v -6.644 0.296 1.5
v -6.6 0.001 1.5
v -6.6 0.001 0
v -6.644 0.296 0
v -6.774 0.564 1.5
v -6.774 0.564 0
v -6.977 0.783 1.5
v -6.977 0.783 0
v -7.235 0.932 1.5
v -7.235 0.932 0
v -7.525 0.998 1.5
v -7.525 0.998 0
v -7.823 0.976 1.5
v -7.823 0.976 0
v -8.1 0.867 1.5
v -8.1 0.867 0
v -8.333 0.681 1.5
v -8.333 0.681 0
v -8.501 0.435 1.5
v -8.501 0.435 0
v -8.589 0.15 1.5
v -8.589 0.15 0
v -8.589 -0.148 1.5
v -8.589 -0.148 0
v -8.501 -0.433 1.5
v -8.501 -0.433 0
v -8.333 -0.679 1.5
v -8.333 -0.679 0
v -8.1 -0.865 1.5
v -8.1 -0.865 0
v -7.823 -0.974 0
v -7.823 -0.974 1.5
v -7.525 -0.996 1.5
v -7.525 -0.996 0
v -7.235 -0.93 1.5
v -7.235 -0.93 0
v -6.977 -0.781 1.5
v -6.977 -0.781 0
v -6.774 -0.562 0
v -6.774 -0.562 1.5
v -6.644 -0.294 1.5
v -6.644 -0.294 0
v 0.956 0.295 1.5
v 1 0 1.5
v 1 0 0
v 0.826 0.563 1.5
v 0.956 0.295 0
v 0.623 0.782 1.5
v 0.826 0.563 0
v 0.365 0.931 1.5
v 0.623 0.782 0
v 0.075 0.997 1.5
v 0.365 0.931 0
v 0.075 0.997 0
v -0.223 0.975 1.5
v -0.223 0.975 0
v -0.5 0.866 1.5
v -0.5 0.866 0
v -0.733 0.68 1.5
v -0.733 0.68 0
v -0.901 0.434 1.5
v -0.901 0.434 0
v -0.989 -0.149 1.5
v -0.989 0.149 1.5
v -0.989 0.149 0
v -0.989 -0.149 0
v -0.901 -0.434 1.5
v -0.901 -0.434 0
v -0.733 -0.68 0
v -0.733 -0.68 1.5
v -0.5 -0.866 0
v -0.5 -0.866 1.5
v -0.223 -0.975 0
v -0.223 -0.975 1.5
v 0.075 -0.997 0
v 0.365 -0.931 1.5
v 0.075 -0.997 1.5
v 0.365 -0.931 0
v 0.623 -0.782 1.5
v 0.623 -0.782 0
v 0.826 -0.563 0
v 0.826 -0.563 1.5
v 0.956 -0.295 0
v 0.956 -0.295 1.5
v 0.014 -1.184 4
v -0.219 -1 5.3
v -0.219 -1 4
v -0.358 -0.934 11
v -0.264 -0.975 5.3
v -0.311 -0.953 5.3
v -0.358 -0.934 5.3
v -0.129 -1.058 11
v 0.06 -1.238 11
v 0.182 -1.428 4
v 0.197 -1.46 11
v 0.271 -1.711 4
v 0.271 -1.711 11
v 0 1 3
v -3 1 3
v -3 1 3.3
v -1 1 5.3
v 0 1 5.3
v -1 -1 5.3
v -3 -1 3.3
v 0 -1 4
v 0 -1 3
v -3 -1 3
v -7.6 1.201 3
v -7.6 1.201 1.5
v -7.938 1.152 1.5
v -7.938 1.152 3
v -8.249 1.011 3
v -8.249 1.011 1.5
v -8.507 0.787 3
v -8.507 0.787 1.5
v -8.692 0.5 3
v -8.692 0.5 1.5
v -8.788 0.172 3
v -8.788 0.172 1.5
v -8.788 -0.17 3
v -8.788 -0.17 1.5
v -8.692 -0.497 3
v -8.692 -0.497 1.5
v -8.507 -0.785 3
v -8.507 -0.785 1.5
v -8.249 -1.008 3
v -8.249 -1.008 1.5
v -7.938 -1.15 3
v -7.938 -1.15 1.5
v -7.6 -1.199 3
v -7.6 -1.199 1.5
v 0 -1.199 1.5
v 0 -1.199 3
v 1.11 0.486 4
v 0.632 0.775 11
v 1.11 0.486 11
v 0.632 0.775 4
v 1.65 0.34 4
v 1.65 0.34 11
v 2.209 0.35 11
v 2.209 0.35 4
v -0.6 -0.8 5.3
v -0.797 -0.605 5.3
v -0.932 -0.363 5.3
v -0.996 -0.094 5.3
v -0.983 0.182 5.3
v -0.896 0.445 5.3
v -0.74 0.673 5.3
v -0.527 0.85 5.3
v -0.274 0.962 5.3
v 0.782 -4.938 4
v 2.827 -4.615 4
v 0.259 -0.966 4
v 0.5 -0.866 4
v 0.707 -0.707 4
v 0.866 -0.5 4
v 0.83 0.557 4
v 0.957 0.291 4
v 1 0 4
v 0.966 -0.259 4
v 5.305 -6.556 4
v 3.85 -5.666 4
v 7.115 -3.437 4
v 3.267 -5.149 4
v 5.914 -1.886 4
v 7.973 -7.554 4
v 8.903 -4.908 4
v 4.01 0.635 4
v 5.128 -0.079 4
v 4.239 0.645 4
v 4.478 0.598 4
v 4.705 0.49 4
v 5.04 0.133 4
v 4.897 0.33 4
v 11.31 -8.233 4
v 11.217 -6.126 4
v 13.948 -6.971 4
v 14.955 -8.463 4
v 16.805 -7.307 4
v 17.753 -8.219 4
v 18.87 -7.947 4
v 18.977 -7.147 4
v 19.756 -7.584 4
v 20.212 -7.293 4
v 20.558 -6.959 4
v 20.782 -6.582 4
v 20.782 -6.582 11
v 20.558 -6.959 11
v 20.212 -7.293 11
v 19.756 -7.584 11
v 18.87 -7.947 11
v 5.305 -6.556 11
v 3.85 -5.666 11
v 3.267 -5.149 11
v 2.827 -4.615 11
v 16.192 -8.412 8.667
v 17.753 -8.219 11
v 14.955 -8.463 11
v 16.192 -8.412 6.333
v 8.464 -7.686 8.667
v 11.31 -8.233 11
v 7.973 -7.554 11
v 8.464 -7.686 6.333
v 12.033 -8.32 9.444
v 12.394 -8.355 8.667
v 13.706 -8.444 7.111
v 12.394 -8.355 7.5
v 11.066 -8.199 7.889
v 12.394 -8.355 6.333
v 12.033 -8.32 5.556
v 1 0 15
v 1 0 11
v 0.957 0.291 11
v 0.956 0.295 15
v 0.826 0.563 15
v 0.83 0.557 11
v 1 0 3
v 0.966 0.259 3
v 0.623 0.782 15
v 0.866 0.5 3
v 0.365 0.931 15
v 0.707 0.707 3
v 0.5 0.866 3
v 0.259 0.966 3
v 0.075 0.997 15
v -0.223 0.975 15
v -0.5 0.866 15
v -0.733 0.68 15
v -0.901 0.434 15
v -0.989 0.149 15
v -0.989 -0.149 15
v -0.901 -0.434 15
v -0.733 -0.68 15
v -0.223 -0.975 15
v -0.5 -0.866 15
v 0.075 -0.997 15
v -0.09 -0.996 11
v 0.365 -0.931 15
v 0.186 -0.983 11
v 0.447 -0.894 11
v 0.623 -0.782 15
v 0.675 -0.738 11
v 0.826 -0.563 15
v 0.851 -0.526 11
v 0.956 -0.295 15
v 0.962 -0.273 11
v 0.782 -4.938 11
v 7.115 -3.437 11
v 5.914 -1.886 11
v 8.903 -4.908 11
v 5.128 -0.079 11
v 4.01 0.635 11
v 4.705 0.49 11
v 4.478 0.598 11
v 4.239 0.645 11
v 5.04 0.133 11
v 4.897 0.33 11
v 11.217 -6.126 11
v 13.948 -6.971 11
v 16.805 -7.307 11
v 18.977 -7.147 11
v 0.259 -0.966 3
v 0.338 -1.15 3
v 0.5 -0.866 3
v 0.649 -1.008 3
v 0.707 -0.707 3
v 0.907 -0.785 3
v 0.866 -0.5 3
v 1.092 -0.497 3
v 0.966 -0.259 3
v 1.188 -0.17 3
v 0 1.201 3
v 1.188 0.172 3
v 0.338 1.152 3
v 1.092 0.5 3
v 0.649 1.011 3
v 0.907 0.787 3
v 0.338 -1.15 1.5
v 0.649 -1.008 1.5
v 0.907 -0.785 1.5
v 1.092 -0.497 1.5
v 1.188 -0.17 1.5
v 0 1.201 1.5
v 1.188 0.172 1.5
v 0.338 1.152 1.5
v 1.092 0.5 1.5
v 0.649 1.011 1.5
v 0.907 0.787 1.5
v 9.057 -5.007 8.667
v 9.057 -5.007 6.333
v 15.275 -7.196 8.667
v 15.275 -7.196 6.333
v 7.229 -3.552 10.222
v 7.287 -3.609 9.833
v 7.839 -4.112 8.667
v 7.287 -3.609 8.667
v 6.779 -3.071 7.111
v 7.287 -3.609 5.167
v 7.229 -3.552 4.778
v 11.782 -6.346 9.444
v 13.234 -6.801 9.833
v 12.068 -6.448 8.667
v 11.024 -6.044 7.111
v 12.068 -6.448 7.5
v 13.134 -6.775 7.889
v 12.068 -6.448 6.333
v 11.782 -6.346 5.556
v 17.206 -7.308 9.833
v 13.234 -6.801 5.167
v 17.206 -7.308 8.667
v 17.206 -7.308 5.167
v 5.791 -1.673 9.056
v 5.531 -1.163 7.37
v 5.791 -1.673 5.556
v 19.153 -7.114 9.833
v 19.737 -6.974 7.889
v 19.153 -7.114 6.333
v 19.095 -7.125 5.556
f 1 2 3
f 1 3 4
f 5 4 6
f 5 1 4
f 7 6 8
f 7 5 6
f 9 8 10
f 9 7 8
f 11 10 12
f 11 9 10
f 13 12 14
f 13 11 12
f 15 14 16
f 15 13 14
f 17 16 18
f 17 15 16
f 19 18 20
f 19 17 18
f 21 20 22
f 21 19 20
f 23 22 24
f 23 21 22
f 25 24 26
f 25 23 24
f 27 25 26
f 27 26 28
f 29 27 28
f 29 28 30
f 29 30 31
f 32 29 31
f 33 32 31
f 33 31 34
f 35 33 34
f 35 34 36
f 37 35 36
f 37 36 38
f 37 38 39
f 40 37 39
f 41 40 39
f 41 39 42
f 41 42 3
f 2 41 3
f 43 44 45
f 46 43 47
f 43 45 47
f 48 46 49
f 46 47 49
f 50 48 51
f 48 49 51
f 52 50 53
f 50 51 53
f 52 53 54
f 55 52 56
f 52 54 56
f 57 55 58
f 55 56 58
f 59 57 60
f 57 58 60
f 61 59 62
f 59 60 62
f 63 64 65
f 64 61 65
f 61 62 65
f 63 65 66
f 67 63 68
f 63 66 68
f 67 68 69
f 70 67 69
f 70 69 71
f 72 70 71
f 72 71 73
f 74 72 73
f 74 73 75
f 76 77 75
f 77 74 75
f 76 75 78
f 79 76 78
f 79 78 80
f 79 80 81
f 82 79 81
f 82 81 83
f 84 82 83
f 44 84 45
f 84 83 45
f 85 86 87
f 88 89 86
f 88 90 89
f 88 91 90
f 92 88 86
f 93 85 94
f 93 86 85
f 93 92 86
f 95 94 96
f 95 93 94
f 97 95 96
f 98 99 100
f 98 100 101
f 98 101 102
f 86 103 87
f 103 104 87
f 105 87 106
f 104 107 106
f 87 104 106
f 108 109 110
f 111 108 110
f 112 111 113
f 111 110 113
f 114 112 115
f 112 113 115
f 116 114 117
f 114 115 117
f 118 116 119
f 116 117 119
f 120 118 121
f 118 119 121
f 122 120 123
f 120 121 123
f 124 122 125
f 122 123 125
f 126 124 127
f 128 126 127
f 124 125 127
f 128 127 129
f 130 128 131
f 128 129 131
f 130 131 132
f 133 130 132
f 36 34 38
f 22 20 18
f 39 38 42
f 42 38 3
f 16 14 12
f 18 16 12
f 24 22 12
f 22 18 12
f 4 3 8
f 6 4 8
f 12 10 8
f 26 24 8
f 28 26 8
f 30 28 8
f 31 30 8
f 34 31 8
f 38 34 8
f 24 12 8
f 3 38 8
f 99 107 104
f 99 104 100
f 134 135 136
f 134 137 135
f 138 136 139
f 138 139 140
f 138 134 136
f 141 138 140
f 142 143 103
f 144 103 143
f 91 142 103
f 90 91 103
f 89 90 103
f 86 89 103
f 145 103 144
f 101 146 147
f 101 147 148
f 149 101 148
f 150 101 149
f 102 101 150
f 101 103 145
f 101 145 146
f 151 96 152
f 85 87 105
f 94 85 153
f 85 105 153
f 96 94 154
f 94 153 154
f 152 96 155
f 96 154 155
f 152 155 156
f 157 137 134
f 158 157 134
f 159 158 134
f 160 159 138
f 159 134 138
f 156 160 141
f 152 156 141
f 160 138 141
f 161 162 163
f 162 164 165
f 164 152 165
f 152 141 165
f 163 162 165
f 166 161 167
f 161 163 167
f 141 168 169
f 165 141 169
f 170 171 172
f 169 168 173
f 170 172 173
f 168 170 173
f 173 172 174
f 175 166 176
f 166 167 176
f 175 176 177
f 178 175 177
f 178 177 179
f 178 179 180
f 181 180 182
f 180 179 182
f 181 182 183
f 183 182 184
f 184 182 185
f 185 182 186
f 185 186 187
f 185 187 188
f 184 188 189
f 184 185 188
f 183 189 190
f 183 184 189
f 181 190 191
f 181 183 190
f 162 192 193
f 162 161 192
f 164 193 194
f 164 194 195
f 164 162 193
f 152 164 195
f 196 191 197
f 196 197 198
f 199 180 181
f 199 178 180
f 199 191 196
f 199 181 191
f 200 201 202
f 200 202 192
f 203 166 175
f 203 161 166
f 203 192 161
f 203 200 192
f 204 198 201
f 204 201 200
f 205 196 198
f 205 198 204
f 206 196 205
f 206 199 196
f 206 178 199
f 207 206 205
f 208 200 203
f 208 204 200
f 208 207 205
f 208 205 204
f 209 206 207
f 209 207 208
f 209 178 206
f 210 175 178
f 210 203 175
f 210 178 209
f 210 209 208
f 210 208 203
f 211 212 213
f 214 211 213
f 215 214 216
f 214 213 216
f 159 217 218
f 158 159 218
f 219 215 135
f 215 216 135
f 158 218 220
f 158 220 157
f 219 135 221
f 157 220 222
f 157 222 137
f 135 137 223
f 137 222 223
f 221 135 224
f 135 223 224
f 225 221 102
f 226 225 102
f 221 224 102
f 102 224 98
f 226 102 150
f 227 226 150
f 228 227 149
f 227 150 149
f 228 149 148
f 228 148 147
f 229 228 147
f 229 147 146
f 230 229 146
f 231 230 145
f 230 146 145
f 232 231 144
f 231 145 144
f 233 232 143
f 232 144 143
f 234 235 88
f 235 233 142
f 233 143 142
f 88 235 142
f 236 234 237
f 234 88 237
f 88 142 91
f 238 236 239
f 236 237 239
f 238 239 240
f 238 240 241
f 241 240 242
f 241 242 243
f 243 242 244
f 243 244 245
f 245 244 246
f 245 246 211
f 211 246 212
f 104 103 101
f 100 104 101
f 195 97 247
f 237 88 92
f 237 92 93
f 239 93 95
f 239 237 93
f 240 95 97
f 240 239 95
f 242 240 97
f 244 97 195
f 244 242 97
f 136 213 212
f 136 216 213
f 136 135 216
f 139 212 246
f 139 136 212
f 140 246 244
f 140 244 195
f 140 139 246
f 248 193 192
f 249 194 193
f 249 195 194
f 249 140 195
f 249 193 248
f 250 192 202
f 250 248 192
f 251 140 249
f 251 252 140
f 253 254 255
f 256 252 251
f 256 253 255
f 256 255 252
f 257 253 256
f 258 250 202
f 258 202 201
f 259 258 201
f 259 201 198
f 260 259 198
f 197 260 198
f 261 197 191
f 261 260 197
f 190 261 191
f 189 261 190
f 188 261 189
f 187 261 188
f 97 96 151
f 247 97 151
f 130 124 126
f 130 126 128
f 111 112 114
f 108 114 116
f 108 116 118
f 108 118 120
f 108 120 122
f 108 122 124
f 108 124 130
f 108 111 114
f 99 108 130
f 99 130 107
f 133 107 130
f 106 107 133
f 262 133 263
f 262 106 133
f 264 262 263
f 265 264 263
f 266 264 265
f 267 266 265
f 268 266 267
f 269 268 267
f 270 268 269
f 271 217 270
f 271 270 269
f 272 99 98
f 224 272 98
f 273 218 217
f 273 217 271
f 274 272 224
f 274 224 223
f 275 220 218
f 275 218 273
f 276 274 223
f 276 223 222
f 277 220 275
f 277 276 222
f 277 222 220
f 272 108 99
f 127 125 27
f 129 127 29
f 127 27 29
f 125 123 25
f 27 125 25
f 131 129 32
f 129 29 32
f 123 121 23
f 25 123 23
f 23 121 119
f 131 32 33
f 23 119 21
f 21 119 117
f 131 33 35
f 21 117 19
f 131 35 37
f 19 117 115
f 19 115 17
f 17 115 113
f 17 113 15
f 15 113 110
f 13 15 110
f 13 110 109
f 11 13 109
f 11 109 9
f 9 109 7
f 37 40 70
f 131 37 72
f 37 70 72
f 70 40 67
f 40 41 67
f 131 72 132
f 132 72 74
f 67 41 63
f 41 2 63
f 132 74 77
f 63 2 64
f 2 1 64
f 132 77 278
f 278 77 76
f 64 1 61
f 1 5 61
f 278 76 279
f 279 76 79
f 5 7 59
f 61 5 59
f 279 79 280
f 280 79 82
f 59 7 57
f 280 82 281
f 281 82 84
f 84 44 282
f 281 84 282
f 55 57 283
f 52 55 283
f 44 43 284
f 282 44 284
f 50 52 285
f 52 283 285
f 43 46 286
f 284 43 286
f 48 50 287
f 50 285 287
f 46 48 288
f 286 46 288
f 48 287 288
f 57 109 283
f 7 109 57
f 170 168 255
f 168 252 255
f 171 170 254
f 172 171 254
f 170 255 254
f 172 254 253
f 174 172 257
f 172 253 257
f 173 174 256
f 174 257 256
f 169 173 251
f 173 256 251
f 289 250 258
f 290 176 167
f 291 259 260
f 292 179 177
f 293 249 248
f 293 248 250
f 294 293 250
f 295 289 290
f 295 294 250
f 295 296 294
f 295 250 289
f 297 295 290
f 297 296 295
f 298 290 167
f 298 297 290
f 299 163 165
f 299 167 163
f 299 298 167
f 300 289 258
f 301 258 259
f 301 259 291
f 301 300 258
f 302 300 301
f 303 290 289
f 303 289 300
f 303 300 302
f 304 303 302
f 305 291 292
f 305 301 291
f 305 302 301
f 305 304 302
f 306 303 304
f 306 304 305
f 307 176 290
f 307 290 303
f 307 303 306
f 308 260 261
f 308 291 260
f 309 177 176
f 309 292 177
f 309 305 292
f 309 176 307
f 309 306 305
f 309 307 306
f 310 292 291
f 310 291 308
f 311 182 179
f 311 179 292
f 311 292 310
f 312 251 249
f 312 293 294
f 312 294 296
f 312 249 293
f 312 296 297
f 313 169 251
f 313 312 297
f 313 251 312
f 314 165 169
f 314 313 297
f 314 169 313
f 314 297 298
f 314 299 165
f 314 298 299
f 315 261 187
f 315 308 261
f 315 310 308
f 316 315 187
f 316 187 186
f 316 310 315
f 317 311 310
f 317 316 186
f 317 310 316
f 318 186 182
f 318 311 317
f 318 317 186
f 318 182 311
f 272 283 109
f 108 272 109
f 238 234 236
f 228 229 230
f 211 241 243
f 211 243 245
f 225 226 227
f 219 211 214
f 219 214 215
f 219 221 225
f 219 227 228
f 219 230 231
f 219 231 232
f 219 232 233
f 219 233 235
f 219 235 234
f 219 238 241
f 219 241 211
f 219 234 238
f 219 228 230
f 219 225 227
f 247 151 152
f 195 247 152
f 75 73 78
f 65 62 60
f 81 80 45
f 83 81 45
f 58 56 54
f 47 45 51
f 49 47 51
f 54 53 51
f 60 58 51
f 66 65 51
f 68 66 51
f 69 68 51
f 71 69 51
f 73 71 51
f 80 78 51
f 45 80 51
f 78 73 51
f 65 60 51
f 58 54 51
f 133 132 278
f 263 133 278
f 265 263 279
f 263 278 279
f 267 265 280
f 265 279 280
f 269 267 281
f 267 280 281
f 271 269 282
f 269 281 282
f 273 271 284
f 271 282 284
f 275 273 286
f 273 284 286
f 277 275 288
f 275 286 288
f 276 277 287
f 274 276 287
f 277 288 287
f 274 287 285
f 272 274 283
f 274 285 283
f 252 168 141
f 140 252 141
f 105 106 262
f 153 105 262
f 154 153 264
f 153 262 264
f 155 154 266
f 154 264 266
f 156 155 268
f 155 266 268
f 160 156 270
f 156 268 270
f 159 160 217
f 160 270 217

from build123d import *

# Parameters (mm, degrees)
SKETCH_1_R      = 1
EXTRUDE_1_DEPTH = 15
EXTRUDE_2_DEPTH = 1.5
SKETCH_3_R      = 1
EXTRUDE_3_DEPTH = 3
SKETCH_4_W      = 3
SKETCH_4_H      = 2
EXTRUDE_4_DEPTH = 2.3
EXTRUDE_5_DEPTH = 7
EXTRUDE_6_DEPTH = 7
FILLET_1_R      = 1
FILLET_2_R      = 1
FILLET_3_R      = 2
CHAMFER_2_SIZE  = 2


# Some blends are built 0.0001 mm under size
with BuildPart() as part:
    # Эскиз1 → Бобышка-Вытянуть1 (new body)
    with BuildSketch(Plane.XY):
        Circle(SKETCH_1_R)
    extrude(amount=EXTRUDE_1_DEPTH)

    # Эскиз2 → Бобышка-Вытянуть2 (add)
    with BuildSketch(Plane(origin=(0, 0, 1.5), x_dir=(-1, 0, 0), z_dir=(0, 0, -1))):
        with BuildLine():
            Line((0, 1.201036303), (7.6, 1.201036303))
            ThreePointArc((7.6, 1.201036303), (8.8, 0.001036303), (7.6, -1.198963697))
            Line((7.6, -1.198963697), (0, -1.198963697))
            ThreePointArc((0, -1.198963697), (-1.2, 0.001036303), (0, 1.201036303))
        make_face()
    extrude(amount=-EXTRUDE_2_DEPTH)

    # Эскиз3 → Бобышка-Вытянуть3 (add)
    with BuildSketch(Plane.XY.offset(3)):
        with Locations((-7.6, 0.001036303)):
            Circle(SKETCH_3_R)
    extrude(amount=-EXTRUDE_3_DEPTH)

    # Эскиз4 → Бобышка-Вытянуть4 (add)
    with BuildSketch(Plane.XY.offset(3)):
        with Locations((-1.5, 0)):
            Rectangle(SKETCH_4_W, SKETCH_4_H)
    extrude(amount=EXTRUDE_4_DEPTH)

    # Эскиз5 → Бобышка-Вытянуть5 (add)
    with BuildSketch(Plane(origin=(0, 0, 4), x_dir=(-1, 0, 0), z_dir=(0, 0, -1))):
        Polygon((0, 0), (-0.782172325, -4.938441703), (-5.720614028, -4.156269378), (-4.938441703, 0.782172325), align=None)
    extrude(amount=-EXTRUDE_5_DEPTH)

    # Эскиз6 → Бобышка-Вытянуть6 (add)
    with BuildSketch(Plane(origin=(0, 0, 4), x_dir=(-1, 0, 0), z_dir=(0, 0, -1))):
        with BuildLine():
            Line((-0.987688341, 0.156434465), (-4.938441703, 0.782172325))
            add(Edge.make_bspline(
                [(-4.938441703, 0.782172325), (-6.035924713, -6.147062691), (-16.447307855, -8.707880394), (-20.782172325, -6.582481038)],
                knots=[0, 0, 0, 0, 1, 1, 1, 1], degree=3))
            add(Edge.make_bspline(
                [(-20.782172325, -6.582481038), (-19.502585952, -9.761328662), (-5.677351674, -8.787425093), (-2.826630593, -4.614631324)],
                knots=[0, 0, 0, 0, 1, 1, 1, 1], degree=3))
            Line((-2.826630593, -4.614631324), (-0.782172325, -4.938441703))
            Line((-0.782172325, -4.938441703), (-0.156434465, -0.987688341))
            ThreePointArc((-0.156434465, -0.987688341), (-0.809016994, -0.587785252), (-0.987688341, 0.156434465))
        make_face()
    extrude(amount=-EXTRUDE_6_DEPTH)

    # Скругление1
    fillet_1_edges = [part.edges().sort_by_distance(p)[0] for p in [
        (4.938441703, 0.782172325, 7.5),
    ]]
    fillet(fillet_1_edges, radius=FILLET_1_R)

    # Скругление2
    # the kernel refuses this fillet: 1 mm, written as the material it adds along each edge
    with BuildSketch(Plane(origin=(0.156434465, -0.987688341, 11), x_dir=(-0.9945218953682737, 0.10452846326764978, 0), z_dir=(0, 0, -1))) as fillet_2_piece_1:
        with BuildLine():
            CenterArc((0.776457135, -0.965925826), FILLET_2_R, 105, 60)
            Line((-0.189468691, -0.707106781), (-0.208787208, -0.7019304))
            Line((-0.208787208, -0.7019304), (-0.019318517, 0.005176381))
            Line((-0.019318517, 0.005176381), (0.005176381, 0.019318517))
            ThreePointArc((0.005176381, 0.019318517), (0.258819045, -0.014074174), (0.512461709, 0.019318517))
            Line((0.512461709, 0.019318517), (0.51763809, 0))
        make_face()
    extrude(amount=7)

    # Скругление3
    fillet_3_edges = [part.edges().sort_by_distance(p)[0] for p in [
        (0.987688341, 0.156434465, 7.5),
    ]]
    fillet(fillet_3_edges, radius=FILLET_3_R)

    # Фаска2
    chamfer_2_edges = [part.edges().sort_by_distance(p)[0] for p in [
        (-3, 0, 5.3),
    ]]
    chamfer(chamfer_2_edges, length=CHAMFER_2_SIZE - 0.0001)  # a hair under: the kernel refuses the full size


solid = part.part
